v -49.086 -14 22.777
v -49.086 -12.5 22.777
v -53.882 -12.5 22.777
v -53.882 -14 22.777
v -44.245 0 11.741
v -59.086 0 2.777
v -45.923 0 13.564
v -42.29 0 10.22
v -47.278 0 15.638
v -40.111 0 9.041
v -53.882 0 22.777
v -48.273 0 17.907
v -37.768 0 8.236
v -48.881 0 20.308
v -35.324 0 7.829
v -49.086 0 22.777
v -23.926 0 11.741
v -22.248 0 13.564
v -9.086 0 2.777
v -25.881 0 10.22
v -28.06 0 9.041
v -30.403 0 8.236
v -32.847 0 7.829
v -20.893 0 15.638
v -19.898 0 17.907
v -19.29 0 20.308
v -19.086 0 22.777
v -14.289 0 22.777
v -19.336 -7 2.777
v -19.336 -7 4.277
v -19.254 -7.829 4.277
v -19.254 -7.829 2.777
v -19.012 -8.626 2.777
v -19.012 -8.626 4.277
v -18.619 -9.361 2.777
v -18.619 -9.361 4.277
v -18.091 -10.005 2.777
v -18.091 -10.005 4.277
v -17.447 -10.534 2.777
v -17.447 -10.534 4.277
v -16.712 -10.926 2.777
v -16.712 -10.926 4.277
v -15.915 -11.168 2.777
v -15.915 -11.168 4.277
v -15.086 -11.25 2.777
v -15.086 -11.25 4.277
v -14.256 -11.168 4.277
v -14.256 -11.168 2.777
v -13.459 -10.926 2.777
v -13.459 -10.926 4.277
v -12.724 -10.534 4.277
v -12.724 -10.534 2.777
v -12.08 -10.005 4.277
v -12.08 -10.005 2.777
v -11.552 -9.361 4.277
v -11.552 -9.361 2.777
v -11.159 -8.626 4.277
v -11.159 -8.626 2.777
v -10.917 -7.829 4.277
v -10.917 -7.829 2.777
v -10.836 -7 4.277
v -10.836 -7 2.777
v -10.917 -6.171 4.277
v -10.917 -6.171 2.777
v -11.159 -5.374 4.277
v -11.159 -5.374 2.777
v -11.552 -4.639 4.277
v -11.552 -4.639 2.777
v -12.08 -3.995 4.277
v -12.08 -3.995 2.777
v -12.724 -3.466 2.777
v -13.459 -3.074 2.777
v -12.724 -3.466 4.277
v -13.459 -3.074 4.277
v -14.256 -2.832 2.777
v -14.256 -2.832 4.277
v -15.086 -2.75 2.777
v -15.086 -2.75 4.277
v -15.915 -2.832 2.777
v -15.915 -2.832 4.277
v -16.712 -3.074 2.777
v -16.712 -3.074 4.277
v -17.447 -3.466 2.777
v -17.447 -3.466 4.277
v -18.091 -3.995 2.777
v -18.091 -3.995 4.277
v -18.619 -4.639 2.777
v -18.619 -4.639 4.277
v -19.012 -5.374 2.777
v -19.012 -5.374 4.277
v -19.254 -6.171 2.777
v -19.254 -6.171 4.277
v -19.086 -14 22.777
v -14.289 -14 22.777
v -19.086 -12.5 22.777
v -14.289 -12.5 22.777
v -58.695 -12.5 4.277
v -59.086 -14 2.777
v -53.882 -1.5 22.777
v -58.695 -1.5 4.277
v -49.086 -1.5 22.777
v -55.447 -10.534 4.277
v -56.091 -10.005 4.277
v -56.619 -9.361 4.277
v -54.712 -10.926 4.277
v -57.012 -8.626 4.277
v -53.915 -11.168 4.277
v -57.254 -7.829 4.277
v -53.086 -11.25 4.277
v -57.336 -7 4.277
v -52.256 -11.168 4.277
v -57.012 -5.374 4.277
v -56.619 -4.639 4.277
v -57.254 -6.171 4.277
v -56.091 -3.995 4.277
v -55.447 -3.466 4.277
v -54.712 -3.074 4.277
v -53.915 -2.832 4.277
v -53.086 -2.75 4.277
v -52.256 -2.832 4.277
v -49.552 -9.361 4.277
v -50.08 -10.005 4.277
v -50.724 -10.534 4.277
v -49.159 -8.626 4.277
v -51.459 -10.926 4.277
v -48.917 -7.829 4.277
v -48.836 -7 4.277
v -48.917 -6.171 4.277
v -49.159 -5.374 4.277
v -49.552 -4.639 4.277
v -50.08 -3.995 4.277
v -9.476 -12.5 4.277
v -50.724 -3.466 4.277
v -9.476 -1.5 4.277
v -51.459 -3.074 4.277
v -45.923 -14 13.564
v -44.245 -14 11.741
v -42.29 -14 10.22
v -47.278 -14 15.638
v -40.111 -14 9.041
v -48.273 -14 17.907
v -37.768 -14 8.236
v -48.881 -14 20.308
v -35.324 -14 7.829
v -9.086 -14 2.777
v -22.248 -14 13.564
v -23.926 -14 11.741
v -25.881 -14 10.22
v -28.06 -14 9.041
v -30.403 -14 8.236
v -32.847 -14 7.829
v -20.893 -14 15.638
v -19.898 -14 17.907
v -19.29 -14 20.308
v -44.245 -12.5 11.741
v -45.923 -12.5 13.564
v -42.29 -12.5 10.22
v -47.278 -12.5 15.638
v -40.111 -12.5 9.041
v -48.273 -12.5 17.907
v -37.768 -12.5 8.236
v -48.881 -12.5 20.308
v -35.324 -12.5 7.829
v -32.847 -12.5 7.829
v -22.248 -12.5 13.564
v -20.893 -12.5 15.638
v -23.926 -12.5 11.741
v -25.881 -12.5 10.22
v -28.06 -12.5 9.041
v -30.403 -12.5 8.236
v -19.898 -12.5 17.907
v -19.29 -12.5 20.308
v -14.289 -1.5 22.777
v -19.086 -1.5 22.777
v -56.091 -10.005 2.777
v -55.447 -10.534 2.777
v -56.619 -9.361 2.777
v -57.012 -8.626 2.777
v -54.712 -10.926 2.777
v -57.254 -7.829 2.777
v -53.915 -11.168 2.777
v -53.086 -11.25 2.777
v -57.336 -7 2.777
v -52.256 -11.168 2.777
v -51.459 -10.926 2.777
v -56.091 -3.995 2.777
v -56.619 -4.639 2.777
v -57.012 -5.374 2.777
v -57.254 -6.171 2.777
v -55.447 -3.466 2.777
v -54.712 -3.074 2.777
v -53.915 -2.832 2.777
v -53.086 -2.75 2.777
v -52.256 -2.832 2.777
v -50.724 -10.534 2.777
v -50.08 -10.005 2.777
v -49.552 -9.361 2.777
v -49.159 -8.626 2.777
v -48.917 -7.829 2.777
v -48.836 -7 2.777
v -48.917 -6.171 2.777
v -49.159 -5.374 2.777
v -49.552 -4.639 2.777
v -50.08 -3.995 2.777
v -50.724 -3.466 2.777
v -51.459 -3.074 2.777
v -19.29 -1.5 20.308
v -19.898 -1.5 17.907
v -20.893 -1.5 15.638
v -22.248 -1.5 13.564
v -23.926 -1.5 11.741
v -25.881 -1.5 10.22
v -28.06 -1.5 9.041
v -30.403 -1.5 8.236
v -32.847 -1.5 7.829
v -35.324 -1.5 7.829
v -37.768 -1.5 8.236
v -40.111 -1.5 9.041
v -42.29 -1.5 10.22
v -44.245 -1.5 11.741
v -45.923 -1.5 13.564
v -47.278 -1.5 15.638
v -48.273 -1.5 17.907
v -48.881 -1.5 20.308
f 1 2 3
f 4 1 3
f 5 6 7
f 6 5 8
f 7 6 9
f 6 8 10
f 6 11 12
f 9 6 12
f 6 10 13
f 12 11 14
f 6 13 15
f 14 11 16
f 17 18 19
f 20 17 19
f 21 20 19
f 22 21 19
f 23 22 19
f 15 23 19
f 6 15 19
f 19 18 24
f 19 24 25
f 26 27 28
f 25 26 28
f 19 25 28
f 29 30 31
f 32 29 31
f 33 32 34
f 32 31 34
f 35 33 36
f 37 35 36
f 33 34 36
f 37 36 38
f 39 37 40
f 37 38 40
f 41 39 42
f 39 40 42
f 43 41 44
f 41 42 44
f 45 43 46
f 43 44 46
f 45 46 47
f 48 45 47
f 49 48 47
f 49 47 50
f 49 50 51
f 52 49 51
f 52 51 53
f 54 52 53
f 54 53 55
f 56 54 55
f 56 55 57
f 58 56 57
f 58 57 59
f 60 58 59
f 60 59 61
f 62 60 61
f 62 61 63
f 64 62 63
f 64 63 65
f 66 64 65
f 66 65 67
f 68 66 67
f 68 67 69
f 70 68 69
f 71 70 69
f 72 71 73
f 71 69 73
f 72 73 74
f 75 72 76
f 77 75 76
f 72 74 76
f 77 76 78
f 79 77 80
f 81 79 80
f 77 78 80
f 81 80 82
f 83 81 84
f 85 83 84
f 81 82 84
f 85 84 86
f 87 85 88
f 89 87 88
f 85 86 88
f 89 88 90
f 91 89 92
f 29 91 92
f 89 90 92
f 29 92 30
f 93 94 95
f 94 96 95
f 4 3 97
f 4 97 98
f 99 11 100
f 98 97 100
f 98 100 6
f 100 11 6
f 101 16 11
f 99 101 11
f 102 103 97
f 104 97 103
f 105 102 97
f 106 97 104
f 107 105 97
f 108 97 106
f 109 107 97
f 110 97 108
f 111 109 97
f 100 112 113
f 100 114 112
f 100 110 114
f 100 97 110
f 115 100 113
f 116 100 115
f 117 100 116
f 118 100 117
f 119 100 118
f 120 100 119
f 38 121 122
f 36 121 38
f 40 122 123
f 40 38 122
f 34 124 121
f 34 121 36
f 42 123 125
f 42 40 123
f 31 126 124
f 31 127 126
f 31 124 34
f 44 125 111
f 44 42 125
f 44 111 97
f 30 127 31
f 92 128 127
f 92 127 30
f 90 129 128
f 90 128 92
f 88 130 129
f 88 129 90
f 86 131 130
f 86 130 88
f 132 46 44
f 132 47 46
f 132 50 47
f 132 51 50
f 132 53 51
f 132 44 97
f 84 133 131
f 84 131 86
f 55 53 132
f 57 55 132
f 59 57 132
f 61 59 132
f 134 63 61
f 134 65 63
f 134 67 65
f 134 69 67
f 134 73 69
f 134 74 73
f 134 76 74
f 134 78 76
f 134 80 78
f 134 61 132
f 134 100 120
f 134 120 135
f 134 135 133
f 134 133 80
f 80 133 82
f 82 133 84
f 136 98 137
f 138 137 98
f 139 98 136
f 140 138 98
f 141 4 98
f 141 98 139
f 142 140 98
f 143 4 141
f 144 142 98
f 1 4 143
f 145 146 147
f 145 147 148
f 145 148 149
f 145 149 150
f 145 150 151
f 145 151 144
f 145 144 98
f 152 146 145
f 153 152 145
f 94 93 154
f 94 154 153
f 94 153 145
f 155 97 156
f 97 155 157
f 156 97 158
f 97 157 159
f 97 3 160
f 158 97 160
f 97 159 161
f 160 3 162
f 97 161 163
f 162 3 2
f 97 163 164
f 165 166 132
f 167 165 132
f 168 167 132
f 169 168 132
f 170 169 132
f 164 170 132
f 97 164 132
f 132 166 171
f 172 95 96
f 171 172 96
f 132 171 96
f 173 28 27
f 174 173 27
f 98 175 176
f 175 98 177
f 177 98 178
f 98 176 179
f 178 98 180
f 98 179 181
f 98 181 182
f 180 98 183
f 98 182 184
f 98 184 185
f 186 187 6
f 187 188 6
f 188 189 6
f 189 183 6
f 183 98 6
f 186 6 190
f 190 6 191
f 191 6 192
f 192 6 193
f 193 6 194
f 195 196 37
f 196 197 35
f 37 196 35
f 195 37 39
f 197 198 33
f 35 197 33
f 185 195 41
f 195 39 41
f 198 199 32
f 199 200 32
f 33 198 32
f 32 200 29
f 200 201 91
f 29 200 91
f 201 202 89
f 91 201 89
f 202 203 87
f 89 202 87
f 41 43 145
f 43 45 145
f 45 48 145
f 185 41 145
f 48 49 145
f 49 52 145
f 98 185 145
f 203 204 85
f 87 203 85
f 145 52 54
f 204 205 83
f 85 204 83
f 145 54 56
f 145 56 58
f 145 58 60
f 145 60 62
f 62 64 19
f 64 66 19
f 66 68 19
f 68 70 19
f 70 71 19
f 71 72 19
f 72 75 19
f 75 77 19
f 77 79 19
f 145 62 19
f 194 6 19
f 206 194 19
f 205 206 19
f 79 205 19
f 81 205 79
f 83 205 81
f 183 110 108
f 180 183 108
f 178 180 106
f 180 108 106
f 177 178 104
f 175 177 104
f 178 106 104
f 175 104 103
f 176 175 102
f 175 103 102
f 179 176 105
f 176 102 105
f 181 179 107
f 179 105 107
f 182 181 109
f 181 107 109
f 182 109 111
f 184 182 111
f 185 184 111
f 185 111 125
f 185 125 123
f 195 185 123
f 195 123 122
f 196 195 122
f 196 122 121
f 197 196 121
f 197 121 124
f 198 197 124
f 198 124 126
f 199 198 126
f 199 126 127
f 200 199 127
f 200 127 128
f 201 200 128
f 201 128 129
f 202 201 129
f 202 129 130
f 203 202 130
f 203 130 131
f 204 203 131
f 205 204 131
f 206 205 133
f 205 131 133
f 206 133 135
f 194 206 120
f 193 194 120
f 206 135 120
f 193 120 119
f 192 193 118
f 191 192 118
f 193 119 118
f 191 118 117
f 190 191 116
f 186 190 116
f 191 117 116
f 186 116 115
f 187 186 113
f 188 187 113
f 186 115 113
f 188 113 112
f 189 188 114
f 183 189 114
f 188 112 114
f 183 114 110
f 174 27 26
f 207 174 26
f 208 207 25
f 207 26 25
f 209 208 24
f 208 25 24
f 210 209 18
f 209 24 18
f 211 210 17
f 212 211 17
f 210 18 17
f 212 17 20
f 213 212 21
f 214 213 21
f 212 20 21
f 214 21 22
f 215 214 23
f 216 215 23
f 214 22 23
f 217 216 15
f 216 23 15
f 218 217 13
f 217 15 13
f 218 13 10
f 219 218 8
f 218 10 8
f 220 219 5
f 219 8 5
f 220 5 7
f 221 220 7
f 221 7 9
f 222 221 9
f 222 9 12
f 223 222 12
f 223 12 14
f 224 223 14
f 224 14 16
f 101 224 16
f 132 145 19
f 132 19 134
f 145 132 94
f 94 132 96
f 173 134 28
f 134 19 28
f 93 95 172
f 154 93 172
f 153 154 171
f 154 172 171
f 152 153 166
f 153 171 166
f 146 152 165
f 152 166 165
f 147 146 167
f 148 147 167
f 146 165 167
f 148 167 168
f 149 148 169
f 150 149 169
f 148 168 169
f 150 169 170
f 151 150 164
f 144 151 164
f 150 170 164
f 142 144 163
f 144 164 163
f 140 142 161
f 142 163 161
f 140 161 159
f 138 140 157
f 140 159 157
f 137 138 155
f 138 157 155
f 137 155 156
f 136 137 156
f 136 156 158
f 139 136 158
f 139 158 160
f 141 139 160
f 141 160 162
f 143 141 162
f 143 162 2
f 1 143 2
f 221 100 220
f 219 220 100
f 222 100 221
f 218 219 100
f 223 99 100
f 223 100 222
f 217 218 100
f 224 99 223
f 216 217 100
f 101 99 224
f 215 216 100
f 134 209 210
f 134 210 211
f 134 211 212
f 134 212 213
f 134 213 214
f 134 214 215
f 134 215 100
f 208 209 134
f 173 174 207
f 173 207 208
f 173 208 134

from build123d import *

# Parameters (mm, degrees)
F1_DEPTH = 14
F2_T     = -1.5
F4_D     = 8.5
F5_D     = 8.5


with BuildPart() as f1:
    # F0 (on Front) → F1 (new body)
    with BuildSketch(Plane.XZ):
        with BuildLine():
            Line((-53.882042, 22.777336), (-59.085524, 2.777336))
            Line((-59.085524, 2.777336), (-9.085524, 2.777336))
            Line((-9.085524, 2.777336), (-14.289005, 22.777336))
            Line((-14.289005, 22.777336), (-19.085524, 22.777336))
            ThreePointArc((-19.085524, 22.777336), (-34.085524, 7.777336), (-49.085524, 22.777336))
            Line((-49.085524, 22.777336), (-53.882042, 22.777336))
        make_face()
    extrude(amount=F1_DEPTH)

    # F2
    f2_openings = [f1.faces().sort_by_distance(p)[0] for p in [
        (-56.483783, -7, 12.777336),
        (-51.483783, -7, 22.777336),
        (-34.085524, -7, 7.777336),
        (-16.687264, -7, 22.777336),
        (-11.687264, -7, 12.777336),
    ]]
    offset(amount=F2_T, openings=f2_openings)

    # F4 (through all)
    with Locations(Plane(origin=(0, 0, 2.777336), x_dir=(1, 0, 0), z_dir=(0, 0, -1))):
        with Locations((-53.085524, 7)):
            Hole(F4_D / 2)

    # F5 (through all)
    with Locations(Plane(origin=(0, 0, 2.777336), x_dir=(1, 0, 0), z_dir=(0, 0, -1))):
        with Locations((-15.085524, 7)):
            Hole(F5_D / 2)


solid = f1.part
